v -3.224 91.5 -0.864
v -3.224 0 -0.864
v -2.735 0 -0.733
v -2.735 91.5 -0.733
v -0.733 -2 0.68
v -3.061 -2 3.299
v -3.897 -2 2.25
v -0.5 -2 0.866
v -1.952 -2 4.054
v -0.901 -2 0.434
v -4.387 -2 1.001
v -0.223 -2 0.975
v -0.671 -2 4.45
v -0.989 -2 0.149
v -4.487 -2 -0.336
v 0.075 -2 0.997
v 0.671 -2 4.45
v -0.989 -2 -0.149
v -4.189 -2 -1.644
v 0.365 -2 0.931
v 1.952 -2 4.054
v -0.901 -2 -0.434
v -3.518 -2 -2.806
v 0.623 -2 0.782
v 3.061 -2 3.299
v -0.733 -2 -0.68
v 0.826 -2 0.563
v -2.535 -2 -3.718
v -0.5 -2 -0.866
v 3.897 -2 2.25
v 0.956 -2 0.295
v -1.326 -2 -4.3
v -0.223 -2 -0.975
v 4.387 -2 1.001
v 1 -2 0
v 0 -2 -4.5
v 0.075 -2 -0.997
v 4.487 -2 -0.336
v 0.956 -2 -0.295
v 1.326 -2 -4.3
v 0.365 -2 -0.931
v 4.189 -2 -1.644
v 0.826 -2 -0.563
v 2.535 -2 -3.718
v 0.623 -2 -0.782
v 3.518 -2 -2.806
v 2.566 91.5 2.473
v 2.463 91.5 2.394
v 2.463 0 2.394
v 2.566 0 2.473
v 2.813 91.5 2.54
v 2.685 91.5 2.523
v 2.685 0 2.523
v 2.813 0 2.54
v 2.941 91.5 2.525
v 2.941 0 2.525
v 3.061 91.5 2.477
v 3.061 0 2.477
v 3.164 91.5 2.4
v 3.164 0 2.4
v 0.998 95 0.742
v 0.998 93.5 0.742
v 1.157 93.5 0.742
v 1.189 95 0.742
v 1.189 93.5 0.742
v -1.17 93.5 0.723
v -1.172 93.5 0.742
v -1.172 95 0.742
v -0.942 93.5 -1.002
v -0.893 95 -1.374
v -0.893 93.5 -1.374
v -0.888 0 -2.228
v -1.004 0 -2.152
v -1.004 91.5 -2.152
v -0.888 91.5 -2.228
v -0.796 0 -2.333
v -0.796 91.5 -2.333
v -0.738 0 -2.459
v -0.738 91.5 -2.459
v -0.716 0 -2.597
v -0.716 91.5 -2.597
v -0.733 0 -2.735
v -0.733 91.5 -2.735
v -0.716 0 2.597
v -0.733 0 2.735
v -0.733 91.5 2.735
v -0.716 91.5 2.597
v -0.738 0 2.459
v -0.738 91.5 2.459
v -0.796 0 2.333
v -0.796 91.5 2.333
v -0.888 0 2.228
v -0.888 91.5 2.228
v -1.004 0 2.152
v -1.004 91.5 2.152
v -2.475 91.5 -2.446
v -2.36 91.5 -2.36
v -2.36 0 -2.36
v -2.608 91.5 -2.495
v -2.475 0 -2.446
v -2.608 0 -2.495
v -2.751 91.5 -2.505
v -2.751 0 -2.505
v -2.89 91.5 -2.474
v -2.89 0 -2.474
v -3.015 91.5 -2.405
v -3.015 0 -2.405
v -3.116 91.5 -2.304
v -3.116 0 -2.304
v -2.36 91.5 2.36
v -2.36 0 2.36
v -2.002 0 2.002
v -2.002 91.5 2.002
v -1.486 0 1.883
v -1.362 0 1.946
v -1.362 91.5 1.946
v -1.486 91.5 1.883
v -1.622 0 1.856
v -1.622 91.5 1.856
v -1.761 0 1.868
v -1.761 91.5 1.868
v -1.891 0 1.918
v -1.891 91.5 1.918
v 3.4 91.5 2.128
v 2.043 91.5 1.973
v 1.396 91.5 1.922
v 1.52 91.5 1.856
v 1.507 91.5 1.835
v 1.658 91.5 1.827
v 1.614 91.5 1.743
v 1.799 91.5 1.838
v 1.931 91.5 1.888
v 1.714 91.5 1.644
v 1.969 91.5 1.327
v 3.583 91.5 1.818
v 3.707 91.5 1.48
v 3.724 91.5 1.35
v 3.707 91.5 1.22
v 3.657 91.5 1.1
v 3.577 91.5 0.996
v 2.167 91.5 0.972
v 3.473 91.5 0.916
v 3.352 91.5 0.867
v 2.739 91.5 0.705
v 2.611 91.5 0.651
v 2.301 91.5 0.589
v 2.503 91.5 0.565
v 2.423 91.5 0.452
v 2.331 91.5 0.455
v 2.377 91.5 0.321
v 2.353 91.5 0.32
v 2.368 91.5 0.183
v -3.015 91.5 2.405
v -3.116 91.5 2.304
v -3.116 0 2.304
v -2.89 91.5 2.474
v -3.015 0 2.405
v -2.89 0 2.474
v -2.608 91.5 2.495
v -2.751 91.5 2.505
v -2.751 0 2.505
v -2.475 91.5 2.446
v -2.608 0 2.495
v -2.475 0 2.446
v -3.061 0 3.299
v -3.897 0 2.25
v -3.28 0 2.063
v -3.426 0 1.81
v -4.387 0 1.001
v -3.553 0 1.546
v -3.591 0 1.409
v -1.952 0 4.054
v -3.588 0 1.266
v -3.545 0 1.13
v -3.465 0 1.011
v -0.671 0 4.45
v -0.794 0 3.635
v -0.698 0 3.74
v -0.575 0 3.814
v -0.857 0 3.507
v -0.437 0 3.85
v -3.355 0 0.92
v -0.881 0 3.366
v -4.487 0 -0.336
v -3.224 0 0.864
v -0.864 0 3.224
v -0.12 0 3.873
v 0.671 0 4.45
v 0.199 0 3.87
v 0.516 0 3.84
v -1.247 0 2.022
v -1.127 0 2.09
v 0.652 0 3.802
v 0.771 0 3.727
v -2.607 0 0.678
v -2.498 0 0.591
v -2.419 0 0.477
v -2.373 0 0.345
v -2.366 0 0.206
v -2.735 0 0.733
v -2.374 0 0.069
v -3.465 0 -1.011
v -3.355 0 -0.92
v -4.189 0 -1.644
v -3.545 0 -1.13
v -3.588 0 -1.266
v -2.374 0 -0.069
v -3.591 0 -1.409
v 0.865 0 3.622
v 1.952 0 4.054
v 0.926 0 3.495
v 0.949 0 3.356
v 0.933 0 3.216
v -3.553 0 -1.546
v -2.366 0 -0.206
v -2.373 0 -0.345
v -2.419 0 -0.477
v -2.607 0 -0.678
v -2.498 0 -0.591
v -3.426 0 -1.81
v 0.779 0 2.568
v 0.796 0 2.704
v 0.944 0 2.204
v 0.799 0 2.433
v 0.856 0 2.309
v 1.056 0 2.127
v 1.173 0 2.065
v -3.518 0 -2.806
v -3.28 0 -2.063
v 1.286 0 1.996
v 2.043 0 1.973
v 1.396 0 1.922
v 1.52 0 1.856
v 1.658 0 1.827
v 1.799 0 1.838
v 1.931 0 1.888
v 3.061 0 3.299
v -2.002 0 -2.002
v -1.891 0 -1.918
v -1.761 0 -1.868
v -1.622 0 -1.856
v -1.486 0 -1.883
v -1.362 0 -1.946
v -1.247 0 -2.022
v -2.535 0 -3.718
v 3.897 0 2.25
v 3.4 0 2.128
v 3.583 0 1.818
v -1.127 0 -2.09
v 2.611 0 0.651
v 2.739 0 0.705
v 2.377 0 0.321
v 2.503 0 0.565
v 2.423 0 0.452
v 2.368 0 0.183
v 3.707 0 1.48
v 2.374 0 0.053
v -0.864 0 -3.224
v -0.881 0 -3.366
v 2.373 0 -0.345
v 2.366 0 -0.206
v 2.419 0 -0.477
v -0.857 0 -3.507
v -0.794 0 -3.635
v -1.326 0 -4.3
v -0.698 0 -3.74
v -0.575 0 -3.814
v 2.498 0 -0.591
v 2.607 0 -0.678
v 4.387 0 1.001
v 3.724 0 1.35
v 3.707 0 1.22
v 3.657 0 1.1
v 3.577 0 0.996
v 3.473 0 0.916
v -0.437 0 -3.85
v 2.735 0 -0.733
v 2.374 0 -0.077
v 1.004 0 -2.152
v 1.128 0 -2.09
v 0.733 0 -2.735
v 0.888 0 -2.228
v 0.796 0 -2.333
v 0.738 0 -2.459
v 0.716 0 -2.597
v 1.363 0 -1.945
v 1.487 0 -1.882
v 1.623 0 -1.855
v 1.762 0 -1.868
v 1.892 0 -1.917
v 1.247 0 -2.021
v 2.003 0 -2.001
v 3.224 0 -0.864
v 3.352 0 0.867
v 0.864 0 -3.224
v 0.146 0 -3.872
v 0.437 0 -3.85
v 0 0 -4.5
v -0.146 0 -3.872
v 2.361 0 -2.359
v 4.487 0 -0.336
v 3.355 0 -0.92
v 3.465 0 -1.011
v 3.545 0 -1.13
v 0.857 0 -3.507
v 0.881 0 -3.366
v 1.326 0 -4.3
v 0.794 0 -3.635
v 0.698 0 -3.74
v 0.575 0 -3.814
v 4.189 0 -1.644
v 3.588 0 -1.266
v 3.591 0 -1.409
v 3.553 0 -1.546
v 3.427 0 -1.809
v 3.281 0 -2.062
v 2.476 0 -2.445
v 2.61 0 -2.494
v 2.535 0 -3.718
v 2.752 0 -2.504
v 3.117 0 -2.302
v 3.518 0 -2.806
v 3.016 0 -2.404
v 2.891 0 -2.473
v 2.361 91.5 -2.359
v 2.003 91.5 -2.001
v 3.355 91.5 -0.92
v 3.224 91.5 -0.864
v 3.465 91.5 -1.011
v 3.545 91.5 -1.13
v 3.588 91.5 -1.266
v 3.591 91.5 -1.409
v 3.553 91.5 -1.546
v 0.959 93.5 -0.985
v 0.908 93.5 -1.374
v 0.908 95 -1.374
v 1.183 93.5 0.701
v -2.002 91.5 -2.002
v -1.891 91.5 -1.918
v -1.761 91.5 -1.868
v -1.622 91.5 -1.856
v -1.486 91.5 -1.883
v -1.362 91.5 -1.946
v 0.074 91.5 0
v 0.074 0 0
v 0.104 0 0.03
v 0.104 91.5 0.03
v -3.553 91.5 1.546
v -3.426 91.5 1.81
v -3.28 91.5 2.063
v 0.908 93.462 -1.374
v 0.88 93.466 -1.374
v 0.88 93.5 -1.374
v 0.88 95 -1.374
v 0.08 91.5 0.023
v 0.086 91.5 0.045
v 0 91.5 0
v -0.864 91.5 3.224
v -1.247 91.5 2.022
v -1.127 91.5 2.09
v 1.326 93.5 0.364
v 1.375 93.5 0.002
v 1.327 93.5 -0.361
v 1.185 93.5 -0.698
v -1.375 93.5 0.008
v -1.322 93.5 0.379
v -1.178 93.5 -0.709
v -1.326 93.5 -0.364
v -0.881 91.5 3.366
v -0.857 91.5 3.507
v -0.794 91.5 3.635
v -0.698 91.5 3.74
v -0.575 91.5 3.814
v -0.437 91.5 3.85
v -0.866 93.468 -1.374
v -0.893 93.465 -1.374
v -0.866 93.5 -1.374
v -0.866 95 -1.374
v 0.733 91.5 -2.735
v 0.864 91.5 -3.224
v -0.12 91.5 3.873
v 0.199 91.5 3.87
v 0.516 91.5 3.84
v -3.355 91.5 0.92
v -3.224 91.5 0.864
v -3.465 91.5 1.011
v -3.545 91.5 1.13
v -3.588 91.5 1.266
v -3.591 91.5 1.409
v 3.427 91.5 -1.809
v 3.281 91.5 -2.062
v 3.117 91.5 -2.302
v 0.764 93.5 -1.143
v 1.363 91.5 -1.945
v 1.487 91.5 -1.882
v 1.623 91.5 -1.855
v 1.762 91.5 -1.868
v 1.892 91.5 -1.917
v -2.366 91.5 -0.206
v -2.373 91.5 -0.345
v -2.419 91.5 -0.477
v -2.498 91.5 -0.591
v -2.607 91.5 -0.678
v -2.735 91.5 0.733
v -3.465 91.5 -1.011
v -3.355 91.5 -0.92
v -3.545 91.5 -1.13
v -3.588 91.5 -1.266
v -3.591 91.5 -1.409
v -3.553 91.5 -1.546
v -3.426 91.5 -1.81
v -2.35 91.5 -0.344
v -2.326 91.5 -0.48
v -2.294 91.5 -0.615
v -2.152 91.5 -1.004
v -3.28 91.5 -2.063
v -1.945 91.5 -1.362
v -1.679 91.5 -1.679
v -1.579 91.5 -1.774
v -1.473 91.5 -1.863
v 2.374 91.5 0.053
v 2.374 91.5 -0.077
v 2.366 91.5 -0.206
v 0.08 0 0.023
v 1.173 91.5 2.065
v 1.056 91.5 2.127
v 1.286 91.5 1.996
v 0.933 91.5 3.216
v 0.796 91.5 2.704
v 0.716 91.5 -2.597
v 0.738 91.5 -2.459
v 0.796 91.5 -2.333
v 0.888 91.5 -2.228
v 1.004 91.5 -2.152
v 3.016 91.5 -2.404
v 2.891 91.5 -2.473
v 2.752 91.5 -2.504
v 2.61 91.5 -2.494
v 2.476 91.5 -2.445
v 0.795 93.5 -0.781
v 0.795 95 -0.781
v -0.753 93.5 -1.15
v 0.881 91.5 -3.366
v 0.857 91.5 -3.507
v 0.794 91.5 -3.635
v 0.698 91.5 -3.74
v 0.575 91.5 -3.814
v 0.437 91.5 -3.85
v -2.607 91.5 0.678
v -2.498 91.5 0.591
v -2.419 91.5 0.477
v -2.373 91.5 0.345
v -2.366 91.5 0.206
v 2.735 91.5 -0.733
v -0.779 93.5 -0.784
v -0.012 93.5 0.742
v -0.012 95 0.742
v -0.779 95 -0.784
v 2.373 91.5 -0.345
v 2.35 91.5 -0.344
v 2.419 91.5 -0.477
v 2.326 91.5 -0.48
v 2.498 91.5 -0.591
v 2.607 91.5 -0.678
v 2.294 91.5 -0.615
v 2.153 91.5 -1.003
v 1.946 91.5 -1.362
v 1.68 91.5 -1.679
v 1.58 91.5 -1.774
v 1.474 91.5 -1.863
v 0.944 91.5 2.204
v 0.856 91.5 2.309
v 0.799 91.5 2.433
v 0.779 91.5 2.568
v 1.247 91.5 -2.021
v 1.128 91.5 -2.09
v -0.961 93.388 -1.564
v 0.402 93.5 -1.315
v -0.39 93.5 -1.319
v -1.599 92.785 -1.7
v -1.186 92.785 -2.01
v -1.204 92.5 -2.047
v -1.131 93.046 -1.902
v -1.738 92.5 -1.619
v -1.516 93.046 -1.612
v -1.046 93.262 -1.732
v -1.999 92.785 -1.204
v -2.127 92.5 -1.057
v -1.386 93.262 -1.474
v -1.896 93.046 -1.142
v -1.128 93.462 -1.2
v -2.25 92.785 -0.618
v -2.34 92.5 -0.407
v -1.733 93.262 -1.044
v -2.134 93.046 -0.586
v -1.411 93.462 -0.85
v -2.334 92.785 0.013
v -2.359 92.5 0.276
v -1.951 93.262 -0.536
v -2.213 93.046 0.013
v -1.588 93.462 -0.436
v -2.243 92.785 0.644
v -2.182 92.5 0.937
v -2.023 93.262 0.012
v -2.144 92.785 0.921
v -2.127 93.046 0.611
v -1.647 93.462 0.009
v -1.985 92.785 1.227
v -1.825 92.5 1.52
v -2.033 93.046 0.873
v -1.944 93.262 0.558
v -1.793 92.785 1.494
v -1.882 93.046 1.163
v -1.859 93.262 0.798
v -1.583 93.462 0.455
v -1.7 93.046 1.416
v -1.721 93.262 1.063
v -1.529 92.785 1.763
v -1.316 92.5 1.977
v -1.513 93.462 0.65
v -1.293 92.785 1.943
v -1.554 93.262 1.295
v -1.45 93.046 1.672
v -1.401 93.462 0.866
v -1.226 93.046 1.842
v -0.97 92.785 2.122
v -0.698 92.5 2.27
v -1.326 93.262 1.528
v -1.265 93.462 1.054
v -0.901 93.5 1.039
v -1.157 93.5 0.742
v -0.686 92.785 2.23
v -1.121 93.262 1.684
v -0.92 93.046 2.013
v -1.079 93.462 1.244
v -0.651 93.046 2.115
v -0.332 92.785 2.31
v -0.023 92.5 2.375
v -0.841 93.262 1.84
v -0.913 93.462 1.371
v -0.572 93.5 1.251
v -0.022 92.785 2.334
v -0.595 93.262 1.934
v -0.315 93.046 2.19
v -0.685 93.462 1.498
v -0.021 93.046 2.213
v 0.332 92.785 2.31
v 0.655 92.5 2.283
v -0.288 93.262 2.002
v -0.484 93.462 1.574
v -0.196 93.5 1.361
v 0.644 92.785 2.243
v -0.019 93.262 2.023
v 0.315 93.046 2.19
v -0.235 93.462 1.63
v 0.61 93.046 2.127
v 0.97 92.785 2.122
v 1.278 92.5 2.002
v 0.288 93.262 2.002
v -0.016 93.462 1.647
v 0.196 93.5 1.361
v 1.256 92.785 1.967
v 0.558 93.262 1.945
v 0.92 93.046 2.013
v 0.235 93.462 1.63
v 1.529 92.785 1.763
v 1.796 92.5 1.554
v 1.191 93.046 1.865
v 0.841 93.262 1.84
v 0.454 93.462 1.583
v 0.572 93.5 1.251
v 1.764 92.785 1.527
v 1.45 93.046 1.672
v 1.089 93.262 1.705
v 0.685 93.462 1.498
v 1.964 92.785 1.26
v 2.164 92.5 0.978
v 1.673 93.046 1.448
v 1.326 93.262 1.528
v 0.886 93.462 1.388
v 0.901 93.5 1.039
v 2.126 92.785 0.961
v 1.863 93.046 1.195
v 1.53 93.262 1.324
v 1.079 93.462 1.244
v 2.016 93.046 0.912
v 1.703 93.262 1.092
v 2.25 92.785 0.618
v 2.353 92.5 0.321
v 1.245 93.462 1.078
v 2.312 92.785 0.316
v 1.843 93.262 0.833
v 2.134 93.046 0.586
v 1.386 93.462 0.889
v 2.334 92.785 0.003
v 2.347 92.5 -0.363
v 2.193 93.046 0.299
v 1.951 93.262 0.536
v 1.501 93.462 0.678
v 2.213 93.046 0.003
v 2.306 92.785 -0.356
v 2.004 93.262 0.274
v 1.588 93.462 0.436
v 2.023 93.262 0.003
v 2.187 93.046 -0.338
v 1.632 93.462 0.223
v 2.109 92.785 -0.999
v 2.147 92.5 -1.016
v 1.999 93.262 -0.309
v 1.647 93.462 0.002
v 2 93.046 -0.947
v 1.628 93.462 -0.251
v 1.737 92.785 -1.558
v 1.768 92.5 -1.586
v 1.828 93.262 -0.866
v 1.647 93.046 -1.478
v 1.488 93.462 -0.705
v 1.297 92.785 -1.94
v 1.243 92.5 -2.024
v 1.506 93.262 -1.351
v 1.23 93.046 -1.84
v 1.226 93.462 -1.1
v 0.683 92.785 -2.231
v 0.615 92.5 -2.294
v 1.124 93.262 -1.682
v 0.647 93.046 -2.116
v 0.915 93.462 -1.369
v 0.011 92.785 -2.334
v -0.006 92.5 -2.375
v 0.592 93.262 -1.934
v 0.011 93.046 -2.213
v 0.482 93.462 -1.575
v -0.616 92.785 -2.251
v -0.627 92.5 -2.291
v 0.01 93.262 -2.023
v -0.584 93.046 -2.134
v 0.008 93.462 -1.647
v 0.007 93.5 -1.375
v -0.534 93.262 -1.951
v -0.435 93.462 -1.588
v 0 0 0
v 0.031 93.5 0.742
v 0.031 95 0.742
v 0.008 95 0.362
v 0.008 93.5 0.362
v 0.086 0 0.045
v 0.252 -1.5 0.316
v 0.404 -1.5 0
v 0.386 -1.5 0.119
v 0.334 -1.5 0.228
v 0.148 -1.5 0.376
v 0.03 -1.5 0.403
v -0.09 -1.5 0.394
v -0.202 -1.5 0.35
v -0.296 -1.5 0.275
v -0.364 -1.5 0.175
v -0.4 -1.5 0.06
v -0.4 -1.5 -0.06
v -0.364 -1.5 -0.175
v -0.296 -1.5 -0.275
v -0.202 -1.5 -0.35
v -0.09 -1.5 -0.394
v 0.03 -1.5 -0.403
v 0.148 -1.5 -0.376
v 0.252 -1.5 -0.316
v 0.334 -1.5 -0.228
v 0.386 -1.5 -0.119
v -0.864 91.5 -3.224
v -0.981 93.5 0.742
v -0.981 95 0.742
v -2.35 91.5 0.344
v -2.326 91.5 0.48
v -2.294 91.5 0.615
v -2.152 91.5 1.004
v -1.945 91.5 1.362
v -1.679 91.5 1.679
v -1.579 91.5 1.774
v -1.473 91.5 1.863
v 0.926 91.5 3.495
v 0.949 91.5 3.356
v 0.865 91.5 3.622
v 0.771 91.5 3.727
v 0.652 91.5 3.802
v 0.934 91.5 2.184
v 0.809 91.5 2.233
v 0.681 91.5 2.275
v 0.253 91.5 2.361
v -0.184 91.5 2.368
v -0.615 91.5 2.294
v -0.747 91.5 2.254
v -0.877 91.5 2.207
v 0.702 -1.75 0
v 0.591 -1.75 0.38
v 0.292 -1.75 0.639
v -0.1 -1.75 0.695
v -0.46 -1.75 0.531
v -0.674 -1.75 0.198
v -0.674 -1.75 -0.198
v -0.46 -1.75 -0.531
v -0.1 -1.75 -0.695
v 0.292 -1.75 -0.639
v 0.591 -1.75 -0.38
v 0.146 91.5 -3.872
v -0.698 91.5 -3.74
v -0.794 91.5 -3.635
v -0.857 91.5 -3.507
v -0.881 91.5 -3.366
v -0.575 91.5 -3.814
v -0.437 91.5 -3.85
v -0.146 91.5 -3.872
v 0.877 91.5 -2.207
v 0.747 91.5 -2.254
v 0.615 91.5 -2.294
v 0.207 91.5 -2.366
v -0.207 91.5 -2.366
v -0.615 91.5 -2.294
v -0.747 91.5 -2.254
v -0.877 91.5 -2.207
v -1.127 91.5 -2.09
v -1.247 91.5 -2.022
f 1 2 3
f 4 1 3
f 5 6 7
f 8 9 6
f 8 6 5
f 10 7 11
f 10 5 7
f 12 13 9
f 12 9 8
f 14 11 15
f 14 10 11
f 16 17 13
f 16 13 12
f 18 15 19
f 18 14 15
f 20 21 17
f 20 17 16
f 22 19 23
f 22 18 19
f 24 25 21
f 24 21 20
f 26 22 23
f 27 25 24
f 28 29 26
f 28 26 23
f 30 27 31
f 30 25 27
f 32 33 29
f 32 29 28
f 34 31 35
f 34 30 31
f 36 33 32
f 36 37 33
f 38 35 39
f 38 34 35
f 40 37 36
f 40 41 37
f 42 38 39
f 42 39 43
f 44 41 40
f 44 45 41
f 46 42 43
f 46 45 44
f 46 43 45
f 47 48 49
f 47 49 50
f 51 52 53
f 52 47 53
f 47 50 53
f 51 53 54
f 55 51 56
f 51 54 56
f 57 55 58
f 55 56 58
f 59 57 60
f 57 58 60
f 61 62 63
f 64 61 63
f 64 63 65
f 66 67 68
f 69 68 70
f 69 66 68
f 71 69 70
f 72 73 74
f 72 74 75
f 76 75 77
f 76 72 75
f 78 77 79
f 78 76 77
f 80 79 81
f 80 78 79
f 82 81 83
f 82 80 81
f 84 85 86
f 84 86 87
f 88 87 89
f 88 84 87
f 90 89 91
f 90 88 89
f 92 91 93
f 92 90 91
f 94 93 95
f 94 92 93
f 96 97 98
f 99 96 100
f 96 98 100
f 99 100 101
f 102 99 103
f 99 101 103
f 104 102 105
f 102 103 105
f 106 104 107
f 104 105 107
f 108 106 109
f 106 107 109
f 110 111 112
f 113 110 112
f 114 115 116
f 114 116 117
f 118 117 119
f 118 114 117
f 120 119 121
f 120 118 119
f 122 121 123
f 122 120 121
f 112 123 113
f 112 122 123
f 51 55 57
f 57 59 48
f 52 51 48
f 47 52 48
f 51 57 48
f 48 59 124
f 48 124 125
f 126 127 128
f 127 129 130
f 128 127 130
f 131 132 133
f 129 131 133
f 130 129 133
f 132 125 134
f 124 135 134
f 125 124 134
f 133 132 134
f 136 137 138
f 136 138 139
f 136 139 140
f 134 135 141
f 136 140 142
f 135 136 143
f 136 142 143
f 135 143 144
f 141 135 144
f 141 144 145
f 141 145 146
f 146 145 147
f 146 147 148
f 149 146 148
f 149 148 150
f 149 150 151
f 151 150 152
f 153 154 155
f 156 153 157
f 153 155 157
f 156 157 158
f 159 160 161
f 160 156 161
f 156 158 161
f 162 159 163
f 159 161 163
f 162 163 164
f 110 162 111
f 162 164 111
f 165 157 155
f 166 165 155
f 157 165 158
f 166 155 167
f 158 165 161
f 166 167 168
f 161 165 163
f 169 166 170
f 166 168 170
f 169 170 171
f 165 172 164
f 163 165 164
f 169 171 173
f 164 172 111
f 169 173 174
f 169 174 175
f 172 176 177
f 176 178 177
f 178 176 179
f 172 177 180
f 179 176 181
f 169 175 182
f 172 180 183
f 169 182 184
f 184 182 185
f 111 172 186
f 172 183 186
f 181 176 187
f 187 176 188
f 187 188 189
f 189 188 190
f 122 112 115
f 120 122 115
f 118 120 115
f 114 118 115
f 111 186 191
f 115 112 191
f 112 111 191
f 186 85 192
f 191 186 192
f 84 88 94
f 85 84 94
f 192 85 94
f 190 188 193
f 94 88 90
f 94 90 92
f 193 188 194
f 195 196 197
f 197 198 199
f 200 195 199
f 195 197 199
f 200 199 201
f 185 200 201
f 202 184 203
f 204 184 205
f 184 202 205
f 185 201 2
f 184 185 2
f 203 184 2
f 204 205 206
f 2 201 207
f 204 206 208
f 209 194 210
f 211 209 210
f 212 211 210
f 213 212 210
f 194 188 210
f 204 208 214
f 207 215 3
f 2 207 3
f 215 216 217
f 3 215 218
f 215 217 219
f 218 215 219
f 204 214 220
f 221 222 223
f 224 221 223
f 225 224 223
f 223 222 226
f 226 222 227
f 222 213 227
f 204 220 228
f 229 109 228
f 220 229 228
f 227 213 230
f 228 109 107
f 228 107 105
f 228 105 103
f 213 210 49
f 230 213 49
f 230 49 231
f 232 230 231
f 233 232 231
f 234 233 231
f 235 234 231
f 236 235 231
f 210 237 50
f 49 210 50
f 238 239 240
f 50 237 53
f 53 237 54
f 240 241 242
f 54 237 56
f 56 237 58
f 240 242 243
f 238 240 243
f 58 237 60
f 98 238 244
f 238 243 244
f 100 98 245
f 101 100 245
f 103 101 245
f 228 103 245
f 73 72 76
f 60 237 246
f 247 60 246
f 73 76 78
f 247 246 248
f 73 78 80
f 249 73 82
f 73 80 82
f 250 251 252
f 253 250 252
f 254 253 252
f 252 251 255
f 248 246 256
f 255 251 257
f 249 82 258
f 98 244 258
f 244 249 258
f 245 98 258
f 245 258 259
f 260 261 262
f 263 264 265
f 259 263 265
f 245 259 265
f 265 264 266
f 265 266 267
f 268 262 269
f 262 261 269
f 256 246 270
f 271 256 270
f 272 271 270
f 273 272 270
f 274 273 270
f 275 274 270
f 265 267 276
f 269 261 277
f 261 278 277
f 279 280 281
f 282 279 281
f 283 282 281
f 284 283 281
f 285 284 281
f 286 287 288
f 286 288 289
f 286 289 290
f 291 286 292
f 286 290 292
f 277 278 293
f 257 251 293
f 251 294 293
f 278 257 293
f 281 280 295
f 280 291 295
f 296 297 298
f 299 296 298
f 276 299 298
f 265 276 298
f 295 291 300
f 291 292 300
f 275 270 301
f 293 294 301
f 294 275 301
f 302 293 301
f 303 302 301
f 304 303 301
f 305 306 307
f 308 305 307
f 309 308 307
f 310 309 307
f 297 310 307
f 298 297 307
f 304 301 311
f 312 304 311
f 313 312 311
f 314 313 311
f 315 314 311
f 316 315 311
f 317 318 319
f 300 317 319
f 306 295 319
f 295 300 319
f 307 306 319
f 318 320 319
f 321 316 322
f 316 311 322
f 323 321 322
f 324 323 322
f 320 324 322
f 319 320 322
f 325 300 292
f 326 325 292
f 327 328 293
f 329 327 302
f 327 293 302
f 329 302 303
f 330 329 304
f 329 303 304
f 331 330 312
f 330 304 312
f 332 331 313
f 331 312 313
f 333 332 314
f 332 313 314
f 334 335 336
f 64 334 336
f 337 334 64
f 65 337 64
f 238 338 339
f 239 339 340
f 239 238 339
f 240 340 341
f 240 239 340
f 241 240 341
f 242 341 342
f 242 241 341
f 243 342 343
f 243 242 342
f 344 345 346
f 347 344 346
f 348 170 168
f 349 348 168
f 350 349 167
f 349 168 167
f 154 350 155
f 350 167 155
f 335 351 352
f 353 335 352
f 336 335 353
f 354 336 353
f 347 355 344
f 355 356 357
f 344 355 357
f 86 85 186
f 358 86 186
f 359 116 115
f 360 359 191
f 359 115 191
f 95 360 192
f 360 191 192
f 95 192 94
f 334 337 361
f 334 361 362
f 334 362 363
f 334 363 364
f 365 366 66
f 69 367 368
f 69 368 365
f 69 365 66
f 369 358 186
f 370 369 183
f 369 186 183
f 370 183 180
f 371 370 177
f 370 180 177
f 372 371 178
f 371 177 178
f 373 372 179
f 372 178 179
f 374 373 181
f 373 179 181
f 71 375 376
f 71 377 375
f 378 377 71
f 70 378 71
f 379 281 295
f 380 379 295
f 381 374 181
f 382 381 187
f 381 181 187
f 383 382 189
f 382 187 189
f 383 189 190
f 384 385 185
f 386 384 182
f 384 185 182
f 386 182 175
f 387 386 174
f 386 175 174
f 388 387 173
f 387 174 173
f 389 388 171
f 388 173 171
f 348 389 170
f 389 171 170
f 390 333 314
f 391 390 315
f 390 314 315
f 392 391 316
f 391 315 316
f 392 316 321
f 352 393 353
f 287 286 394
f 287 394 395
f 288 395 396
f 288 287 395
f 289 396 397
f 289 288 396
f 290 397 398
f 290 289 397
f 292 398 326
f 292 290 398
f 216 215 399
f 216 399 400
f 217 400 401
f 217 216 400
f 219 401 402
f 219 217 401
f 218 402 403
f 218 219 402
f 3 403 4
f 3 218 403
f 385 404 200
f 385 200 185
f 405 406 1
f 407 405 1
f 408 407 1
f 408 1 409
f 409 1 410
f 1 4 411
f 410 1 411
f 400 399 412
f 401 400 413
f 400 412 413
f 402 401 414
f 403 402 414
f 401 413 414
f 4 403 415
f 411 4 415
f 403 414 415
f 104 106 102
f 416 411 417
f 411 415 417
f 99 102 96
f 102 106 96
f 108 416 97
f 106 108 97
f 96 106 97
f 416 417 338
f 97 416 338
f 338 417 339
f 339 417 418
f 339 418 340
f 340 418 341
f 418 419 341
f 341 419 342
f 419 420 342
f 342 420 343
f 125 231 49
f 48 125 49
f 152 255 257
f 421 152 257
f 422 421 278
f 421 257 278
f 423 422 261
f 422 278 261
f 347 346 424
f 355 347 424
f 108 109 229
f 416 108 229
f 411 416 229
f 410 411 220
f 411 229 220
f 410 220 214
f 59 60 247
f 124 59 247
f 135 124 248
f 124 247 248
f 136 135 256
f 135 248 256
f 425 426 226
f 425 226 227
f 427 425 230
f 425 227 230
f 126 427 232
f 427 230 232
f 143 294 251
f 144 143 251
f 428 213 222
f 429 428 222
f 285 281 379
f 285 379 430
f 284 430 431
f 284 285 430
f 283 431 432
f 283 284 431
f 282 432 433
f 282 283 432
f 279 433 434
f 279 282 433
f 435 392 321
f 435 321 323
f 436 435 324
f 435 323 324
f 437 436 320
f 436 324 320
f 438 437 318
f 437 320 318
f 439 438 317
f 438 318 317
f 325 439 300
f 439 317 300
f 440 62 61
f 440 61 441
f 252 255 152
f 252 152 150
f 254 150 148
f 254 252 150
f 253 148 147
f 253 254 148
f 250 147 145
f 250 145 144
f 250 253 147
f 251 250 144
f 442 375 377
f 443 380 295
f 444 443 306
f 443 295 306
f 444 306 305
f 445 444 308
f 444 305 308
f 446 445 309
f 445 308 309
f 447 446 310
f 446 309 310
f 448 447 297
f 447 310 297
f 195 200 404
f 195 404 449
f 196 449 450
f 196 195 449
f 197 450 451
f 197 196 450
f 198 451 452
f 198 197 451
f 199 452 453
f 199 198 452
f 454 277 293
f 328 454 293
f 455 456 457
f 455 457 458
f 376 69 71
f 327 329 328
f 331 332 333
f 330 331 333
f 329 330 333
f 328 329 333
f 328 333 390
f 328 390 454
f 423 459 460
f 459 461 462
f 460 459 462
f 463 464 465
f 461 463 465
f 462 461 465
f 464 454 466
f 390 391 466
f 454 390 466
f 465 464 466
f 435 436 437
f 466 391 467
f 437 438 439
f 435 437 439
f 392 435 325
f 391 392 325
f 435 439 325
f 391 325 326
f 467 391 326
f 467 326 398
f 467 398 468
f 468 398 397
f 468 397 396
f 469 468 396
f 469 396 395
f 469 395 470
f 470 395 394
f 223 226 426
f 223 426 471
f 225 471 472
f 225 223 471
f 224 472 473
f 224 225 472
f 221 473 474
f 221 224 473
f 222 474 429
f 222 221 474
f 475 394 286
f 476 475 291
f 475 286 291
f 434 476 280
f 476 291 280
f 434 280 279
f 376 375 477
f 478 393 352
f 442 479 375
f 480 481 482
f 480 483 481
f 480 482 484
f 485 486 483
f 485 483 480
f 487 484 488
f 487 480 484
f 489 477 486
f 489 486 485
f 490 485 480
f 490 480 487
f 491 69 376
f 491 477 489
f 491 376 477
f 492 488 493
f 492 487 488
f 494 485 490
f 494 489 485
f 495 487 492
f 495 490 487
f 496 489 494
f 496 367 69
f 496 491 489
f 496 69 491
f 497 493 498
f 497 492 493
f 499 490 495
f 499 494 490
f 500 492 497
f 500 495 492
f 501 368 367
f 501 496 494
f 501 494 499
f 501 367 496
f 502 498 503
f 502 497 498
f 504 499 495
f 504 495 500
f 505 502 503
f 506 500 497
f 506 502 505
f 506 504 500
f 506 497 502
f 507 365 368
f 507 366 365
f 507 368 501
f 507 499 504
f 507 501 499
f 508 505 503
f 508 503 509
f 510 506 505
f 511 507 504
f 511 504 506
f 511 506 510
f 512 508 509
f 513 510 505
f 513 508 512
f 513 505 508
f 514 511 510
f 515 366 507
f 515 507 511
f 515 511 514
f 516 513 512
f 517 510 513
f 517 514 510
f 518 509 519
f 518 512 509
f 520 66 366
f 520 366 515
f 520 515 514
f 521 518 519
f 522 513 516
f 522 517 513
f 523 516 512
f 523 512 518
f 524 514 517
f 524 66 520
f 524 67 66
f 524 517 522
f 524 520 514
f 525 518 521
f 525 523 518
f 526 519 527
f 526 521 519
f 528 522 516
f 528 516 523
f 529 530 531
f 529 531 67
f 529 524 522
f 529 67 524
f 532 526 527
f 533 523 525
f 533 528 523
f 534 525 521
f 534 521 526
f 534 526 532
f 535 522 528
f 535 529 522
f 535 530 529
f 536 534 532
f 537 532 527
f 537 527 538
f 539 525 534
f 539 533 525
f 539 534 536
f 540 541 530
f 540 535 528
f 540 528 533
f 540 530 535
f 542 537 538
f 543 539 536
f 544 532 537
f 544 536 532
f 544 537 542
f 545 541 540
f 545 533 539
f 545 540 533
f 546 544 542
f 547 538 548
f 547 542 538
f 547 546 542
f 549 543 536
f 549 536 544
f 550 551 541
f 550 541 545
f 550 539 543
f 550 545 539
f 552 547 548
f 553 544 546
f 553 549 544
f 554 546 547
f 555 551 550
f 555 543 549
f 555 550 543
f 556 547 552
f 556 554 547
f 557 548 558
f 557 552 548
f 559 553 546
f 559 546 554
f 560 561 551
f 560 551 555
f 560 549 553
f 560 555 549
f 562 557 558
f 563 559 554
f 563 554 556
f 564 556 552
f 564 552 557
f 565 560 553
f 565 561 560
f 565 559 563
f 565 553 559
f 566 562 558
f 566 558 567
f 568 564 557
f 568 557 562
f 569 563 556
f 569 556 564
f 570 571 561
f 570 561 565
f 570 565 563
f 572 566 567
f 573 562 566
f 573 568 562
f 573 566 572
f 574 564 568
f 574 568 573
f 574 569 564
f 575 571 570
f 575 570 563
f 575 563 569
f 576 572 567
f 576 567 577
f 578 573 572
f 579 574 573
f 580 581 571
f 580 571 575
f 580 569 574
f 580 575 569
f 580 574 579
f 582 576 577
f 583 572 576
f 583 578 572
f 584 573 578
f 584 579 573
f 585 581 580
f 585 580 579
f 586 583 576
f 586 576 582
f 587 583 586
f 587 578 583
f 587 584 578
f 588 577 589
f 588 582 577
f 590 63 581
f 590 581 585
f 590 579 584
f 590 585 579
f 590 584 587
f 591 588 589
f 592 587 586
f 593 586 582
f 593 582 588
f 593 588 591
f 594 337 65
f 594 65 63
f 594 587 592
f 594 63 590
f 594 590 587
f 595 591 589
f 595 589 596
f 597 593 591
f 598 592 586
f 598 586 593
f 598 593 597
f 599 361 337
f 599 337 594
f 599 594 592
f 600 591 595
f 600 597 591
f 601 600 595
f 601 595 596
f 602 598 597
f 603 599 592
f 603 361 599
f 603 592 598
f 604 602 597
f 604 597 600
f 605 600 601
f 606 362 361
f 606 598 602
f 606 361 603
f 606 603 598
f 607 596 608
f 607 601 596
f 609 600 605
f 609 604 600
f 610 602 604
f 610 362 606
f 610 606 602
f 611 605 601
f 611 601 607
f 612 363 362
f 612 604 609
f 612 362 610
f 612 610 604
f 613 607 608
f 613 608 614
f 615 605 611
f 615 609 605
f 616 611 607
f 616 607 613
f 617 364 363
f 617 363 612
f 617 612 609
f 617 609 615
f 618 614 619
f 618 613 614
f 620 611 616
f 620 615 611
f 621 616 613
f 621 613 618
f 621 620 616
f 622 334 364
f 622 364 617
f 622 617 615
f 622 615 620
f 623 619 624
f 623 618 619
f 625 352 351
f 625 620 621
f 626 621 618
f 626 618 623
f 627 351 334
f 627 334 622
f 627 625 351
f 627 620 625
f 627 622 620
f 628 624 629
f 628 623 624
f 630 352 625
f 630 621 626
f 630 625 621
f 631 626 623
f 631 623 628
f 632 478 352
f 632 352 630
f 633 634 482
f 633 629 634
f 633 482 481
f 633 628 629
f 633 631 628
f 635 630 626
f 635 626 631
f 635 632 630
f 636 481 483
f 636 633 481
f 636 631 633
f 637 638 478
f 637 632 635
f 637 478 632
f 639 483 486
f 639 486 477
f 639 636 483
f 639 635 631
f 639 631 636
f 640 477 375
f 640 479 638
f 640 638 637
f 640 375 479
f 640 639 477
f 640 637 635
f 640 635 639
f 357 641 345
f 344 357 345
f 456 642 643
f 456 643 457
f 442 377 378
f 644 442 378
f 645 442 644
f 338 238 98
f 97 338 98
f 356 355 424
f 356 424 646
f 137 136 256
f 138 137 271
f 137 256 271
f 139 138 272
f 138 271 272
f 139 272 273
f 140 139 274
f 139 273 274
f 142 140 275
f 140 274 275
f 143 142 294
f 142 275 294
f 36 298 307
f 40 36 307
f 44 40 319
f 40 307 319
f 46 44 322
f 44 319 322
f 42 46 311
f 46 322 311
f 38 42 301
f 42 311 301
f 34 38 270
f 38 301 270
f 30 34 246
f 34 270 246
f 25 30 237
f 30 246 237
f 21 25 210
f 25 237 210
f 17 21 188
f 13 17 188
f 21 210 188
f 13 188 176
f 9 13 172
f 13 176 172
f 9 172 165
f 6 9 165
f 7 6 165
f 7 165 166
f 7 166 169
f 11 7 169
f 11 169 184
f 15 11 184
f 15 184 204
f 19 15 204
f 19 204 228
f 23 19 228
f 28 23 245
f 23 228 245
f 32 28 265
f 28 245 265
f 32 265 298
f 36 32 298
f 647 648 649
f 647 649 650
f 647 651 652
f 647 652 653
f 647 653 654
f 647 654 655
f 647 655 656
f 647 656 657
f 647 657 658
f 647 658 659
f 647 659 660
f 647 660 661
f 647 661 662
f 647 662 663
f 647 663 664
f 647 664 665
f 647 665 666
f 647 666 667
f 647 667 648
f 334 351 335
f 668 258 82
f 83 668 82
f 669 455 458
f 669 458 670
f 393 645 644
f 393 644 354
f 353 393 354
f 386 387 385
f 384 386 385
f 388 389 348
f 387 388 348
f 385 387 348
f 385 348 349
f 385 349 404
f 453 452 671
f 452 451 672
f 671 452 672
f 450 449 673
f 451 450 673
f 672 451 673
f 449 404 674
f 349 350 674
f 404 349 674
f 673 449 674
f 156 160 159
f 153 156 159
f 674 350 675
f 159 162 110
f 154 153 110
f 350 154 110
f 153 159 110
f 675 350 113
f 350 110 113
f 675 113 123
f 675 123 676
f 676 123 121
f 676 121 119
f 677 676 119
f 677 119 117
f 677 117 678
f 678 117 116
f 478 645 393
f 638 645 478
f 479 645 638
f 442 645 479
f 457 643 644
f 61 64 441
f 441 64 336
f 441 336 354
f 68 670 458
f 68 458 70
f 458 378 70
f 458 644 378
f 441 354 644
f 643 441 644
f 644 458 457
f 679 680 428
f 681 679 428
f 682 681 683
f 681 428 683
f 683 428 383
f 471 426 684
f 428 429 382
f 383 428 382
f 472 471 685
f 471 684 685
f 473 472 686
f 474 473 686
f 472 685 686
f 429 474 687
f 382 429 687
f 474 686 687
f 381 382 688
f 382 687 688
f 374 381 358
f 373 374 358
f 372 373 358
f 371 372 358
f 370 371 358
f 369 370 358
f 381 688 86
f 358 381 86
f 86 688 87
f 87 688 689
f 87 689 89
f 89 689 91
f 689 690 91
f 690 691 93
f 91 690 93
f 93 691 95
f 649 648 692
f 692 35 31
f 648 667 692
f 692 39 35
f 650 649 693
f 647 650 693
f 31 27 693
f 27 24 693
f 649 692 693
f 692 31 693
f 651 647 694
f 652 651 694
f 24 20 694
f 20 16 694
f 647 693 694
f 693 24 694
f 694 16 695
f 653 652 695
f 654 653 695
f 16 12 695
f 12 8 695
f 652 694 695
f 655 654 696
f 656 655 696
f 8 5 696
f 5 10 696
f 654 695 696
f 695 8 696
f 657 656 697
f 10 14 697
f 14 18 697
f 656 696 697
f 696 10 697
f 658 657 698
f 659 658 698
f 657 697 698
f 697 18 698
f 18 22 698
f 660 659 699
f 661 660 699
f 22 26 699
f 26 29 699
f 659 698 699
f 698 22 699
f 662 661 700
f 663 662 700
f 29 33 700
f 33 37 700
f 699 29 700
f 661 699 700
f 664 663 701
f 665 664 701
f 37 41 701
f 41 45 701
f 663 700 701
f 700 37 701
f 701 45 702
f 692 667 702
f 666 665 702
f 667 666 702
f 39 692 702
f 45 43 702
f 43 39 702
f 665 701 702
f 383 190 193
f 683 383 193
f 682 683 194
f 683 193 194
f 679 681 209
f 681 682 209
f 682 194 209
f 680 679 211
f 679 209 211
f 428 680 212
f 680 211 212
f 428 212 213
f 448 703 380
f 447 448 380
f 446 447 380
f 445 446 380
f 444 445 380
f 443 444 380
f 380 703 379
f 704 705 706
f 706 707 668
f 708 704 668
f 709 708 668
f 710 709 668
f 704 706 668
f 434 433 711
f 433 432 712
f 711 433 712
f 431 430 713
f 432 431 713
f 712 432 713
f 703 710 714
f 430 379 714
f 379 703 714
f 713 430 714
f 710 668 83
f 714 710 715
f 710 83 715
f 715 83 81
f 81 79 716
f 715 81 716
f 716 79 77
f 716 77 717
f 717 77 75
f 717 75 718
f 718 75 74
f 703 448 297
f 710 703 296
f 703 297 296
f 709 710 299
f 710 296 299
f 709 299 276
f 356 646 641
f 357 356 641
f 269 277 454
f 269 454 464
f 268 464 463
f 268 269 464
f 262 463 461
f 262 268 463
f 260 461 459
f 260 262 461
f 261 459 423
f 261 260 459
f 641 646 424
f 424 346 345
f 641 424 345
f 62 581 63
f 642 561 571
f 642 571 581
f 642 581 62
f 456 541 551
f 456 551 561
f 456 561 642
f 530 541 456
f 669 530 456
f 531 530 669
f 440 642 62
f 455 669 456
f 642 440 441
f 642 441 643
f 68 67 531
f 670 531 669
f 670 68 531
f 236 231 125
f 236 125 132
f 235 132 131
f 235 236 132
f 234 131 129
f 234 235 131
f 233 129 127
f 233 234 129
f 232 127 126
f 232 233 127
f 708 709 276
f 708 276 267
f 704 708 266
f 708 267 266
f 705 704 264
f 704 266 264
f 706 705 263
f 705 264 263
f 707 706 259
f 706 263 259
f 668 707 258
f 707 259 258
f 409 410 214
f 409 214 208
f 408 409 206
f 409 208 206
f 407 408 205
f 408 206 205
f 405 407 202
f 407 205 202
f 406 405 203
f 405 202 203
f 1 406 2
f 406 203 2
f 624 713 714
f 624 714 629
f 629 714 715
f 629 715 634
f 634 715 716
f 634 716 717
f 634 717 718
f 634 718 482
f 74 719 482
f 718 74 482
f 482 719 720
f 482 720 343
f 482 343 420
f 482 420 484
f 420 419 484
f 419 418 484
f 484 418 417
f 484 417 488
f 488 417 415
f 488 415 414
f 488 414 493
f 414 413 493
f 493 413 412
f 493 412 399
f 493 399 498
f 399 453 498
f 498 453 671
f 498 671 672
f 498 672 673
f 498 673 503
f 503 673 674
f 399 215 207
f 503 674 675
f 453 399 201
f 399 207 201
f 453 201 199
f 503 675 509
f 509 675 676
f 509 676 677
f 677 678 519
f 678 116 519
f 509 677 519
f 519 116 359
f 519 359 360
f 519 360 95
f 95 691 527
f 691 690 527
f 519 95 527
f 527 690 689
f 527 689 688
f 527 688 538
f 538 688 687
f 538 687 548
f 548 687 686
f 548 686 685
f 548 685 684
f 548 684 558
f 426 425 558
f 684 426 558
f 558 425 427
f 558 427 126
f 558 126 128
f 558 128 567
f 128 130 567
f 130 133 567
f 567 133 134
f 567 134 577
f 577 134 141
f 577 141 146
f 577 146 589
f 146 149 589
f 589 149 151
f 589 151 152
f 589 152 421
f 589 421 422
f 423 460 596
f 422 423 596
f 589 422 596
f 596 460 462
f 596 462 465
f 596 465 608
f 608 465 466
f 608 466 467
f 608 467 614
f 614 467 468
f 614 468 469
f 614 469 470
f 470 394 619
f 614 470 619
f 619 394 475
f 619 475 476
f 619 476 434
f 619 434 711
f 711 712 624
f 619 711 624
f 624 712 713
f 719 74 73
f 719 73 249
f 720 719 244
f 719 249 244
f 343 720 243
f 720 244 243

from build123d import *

# Parameters (mm, degrees)
BOSS_EXTRUDE1_DEPTH = 91.5
SKETCH3_R           = 4.5
BOSS_EXTRUDE2_DEPTH = 2
SKETCH4_R           = 2.375
BOSS_EXTRUDE3_DEPTH = 2
FILLET1_R           = 0.5
SKETCH6_R           = 1
CUT_EXTRUDE4_DEPTH  = 0.5
CUT_EXTRUDE4_DRAFT  = -50
BOSS_EXTRUDE4_DEPTH = 1.5
FILLET2_R           = 1


with BuildPart() as part:
    # Sketch2 → Boss-Extrude1 (new body)
    with BuildSketch(Plane(origin=(0, 0, 0), x_dir=(1, 0, 0), z_dir=(0, 1, 0))):
        with BuildLine():
            Line((3.775215965, -0.978645895), (2.300774305, -0.58912019))
            ThreePointArc((2.300774305, -0.58912019), (2.374963211, 0.013219106), (2.294073837, 0.614695232))
            Line((2.294073837, 0.614695232), (3.742962577, 1.0029238))
            ThreePointArc((3.742962577, 1.0029238), (3.356294138, 1.936727823), (2.741299364, 2.73877761))
            Line((2.741299364, 2.73877761), (1.680151223, 1.678605632))
            ThreePointArc((1.680151223, 1.678605632), (1.187973207, 2.056537055), (0.614695232, 2.294073837))
            Line((0.614695232, 2.294073837), (1.0029238, 3.742962577))
            ThreePointArc((1.0029238, 3.742962577), (0, 3.875), (-1.0029238, 3.742962577))
            Line((-1.0029238, 3.742962577), (-0.614695232, 2.294073837))
            ThreePointArc((-0.614695232, 2.294073837), (-1.1875, 2.056810334), (-1.679378605, 1.679378605))
            Line((-1.679378605, 1.679378605), (-2.740038777, 2.740038777))
            ThreePointArc((-2.740038777, 2.740038777), (-3.35584844, 1.9375), (-3.742962577, 1.0029238))
            Line((-3.742962577, 1.0029238), (-2.294073837, 0.614695232))
            ThreePointArc((-2.294073837, 0.614695232), (-2.375, 0), (-2.294073837, -0.614695232))
            Line((-2.294073837, -0.614695232), (-3.742962577, -1.0029238))
            ThreePointArc((-3.742962577, -1.0029238), (-3.35584844, -1.9375), (-2.740038777, -2.740038777))
            Line((-2.740038777, -2.740038777), (-1.679378605, -1.679378605))
            ThreePointArc((-1.679378605, -1.679378605), (-1.1875, -2.056810334), (-0.614695232, -2.294073837))
            Line((-0.614695232, -2.294073837), (-1.0029238, -3.742962577))
            ThreePointArc((-1.0029238, -3.742962577), (0.033967076, -3.874851125), (1.068386506, -3.724805401))
            Line((1.068386506, -3.724805401), (0.681359786, -2.275164575))
            ThreePointArc((0.681359786, -2.275164575), (1.238849907, -2.026296106), (1.714477211, -1.643530618))
            Line((1.714477211, -1.643530618), (2.767163136, -2.698133353))
            ThreePointArc((2.767163136, -2.698133353), (3.500652231, -1.972912562), (3.775215965, -0.978645895))
        make_face()
        Polygon((0.085836926, -0.044584082), (0, 0), (0.073933818, 0), (0.104207494, -0.030328801), (0.080162685, -0.023330742), align=None, mode=Mode.SUBTRACT)
    extrude(amount=BOSS_EXTRUDE1_DEPTH)

    # Sketch3 → Boss-Extrude2 (add)
    with BuildSketch(Plane.XZ):
        with Locations(Location((0, 0, 0), (0, 0, 270))):
            Circle(SKETCH3_R)
    extrude(amount=BOSS_EXTRUDE2_DEPTH)

    # Sketch4 → Boss-Extrude3 (add)
    with BuildSketch(Plane(origin=(0, 91.5, 0), x_dir=(1, 0, 0), z_dir=(0, 1, 0))):
        with Locations(Location((0, 0, 0), (0, 0, 75))):
            Circle(SKETCH4_R)
    extrude(amount=BOSS_EXTRUDE3_DEPTH)

    # Fillet1
    # the kernel refuses this fillet: 0.5 mm, written as the material it adds along each edge
    with BuildSketch(Plane(origin=(-2.294073837, -1.140469783, 0.614695232), x_dir=(-0.965925826289068, 0, 0.2588190451025218), z_dir=(0, 1, 0)), Plane(origin=(-1.679378605, -1.140469783, -1.679378605), x_dir=(-0.7071067811865478, 0, -0.7071067811865474), z_dir=(0, 1, 0)), Plane(origin=(0.614695232, -1.140469783, -2.294073837), x_dir=(0.2588190451025215, 0, -0.9659258262890681), z_dir=(0, 1, 0)), Plane(origin=(2.294073837, -1.140469783, -0.614695232), x_dir=(0.9659258262890681, 0, -0.2588190451025215), z_dir=(0, 1, 0)), Plane(origin=(-0.614695232, -1.140469783, 2.294073837), x_dir=(-0.2588190451025215, 0, 0.9659258262890681), z_dir=(0, 1, 0))) as fillet1_piece_1:
        with BuildLine():
            CenterArc((0.456187913, -0.5), FILLET1_R, 90, 79.984589832)
            ThreePointArc((-0.036192593, -0.413043478), (-0.00906545, -0.20731306), (0, 0))
            Line((0, 0), (0.456187913, 0))
        make_face()
    extrude(amount=92.640469783)
    with BuildSketch(Plane(origin=(-2.294073837, -1.140469783, -0.614695232), x_dir=(-0.17351574004952178, 0, 0.9848310961556133), z_dir=(0, 1, 0)), Plane(origin=(-1.679378605, -1.140469783, 1.679378605), x_dir=(0.7661308776828862, 0, 0.6426845869171364), z_dir=(0, 1, 0))) as fillet1_piece_2:
        with BuildLine():
            CenterArc((0.458270974, -0.498091484), FILLET1_R, 95.007705084, 79.984589832)
            Line((-0.03982051, -0.45444663), (0, 0))
            ThreePointArc((0, 0), (0.20731306, -0.00906545), (0.414626119, 0))
        make_face()
    extrude(amount=92.640469783)
    with BuildSketch(Plane(origin=(-0.614695232, -1.140469783, -2.294073837), x_dir=(-0.258819045102522, 0, -0.965925826289068), z_dir=(0, 1, 0)), Plane(origin=(1.680151223, -1.140469783, -1.678605632), x_dir=(0.707432093873984, 0, -0.7067813187663288), z_dir=(0, 1, 0))) as fillet1_piece_3:
        with BuildLine():
            CenterArc((0.456187913, 0.5), FILLET1_R, 190.015410168, 79.984589832)
            ThreePointArc((-0.036192593, 0.413043478), (-0.00906545, 0.20731306), (0, 0))
            Line((0, 0), (0.456187913, 0))
        make_face()
    extrude(amount=92.640469783)
    with BuildSketch(Plane(origin=(2.300774305, -1.132506036, 0.58912019), x_dir=(0.16314582309469597, 0, -0.9866019665532569), z_dir=(0, 1, 0))) as fillet1_piece_4:
        with BuildLine():
            CenterArc((0.455070929, -0.498118095), FILLET1_R, 94.972648578, 79.61829146)
            Line((-0.042702606, -0.450985227), (0, 0))
            ThreePointArc((0, 0), (0.20586542, -0.008939048), (0.411730841, 0))
        make_face()
    extrude(amount=92.632506036)
    with BuildSketch(Plane(origin=(1.714477211, -1.163771178, 1.643530618), x_dir=(0.7064632978713467, 0, 0.7077496794494088), z_dir=(0, 1, 0))) as fillet1_piece_5:
        with BuildLine():
            CenterArc((0.465508471, -0.5), FILLET1_R, 90, 81.041880237)
            ThreePointArc((-0.02839274, -0.422143763), (-0.00477723, -0.211705398), (0, 0))
            Line((0, 0), (0.465508471, 0))
        make_face()
    extrude(amount=92.663771178)
    with BuildSketch(Plane(origin=(0.681359786, -1.109284133, 2.275164575), x_dir=(0.9301474254657973, 0, -0.3671862836481626), z_dir=(0, 1, 0))) as fillet1_piece_6:
        with BuildLine():
            CenterArc((0.445739753, -0.498194619), FILLET1_R, 94.870436099, 78.535607624)
            Line((-0.050952689, -0.440778436), (0, 0))
            ThreePointArc((0, 0), (0.201644174, -0.008575561), (0.403288348, 0))
        make_face()
    extrude(amount=92.609284133)
    # the kernel refuses this fillet: 0.5 mm, written as the material it takes off along each edge
    with BuildSketch(Plane(origin=(-2.740038777, 0, 2.740038777), x_dir=(-0.6526300069150477, 0, -0.7576767609436524), z_dir=(0, 1, 0)), Plane(origin=(-3.742962577, 0, -1.0029238), x_dir=(0.32985231937679765, 0, -0.9440325457322681), z_dir=(0, 1, 0)), Plane(origin=(-1.0029238, 0, -3.742962577), x_dir=(0.982482326291838, 0, -0.18635578478860887), z_dir=(0, 1, 0)), Plane(origin=(2.741299364, 0, -2.73877761), x_dir=(0.6522812796019254, 0, 0.7579769998363239), z_dir=(0, 1, 0))) as fillet1_2_piece_1:
        with BuildLine():
            CenterArc((0.538524723, -0.49861874), FILLET1_R, 85.740187873, 98.519624254)
            Line((0.039905983, -0.535758376), (0, 0))
            ThreePointArc((0, 0), (0.287832179, 0.010704768), (0.575664359, 0))
        make_face()
    extrude(amount=92.939160897, mode=Mode.SUBTRACT)
    with BuildSketch(Plane(origin=(-3.742962577, 0, 1.0029238), x_dir=(0.9659258262890679, 0, -0.2588190451025218), z_dir=(0, 1, 0)), Plane(origin=(-2.740038777, 0, -2.740038777), x_dir=(0.7071067811865476, 0, 0.7071067811865476), z_dir=(0, 1, 0)), Plane(origin=(1.0029238, 0, -3.742962577), x_dir=(-0.25881904510252196, 0, 0.965925826289068), z_dir=(0, 1, 0)), Plane(origin=(3.742962577, 0, -1.0029238), x_dir=(-0.9659258262890681, 0, 0.25881904510252185), z_dir=(0, 1, 0)), Plane(origin=(-1.0029238, 0, 3.742962577), x_dir=(0.2588190451025216, 0, -0.9659258262890681), z_dir=(0, 1, 0))) as fillet1_2_piece_2:
        with BuildLine():
            CenterArc((0.537242519, -0.5), FILLET1_R, 90, 98.519624254)
            ThreePointArc((0.04275993, -0.574074074), (0.010704768, -0.287832179), (0, 0))
            Line((0, 0), (0.537242519, 0))
        make_face()
    extrude(amount=92.939160897, mode=Mode.SUBTRACT)
    with BuildSketch(Plane(origin=(3.775215965, 0, 0.978645895), x_dir=(-0.13498089829276533, 0, 0.9908482008340522), z_dir=(0, 1, 0))) as fillet1_2_piece_3:
        with BuildLine():
            CenterArc((0.442538799, -0.49598715), FILLET1_R, 82.736098253, 90.22281865)
            Line((-0.053690457, -0.434696649), (0, 0))
            ThreePointArc((0, 0), (0.252879314, 0.016051399), (0.505758627, 0))
        make_face()
    extrude(amount=92.764396568, mode=Mode.SUBTRACT)
    with BuildSketch(Plane(origin=(2.767163136, 0, 2.698133353), x_dir=(0.8000663385432955, 0, -0.5999115384203949), z_dir=(0, 1, 0))) as fillet1_2_piece_4:
        with BuildLine():
            CenterArc((0.434547354, 0.496131331), FILLET1_R, 188.084320914, 89.047719887)
            Line((-0.060483736, 0.425816179), (0, 0))
            ThreePointArc((0, 0), (0.248312773, -0.015474675), (0.496625547, 0))
        make_face()
    extrude(amount=92.741563867, mode=Mode.SUBTRACT)
    with BuildSketch(Plane(origin=(1.068386506, 0, 3.724805401), x_dir=(-0.9787647804449897, 0, 0.20498659605074468), z_dir=(0, 1, 0))) as fillet1_2_piece_5:
        with BuildLine():
            CenterArc((0.527919562, -0.498672678), FILLET1_R, 85.824226653, 97.295295094)
            Line((0.028660468, -0.525882193), (0, 0))
            ThreePointArc((0, 0), (0.282163904, 0.010286747), (0.564327807, 0))
        make_face()
    extrude(amount=92.910819518, mode=Mode.SUBTRACT)


with BuildPart() as cut_extrude4_tool:
    # Sketch6 → Cut-Extrude4 (with draft: the straight prism first)
    with BuildSketch(Plane.XZ.offset(2)):
        Circle(SKETCH6_R)
    extrude(amount=-CUT_EXTRUDE4_DEPTH)
    # Cut-Extrude4: the draft: its side faces are tilted about the plane it starts from
    cut_extrude4_sides = [cut_extrude4_tool.faces().sort_by_distance(p)[0] for p in [
        (-1, -1.75, 0),
    ]]
    draft(cut_extrude4_sides, Plane.XZ.offset(2), CUT_EXTRUDE4_DRAFT)


with BuildPart() as part_1:
    add(part.part)

    # Cut-Extrude4: cut by cut_extrude4_tool
    add(cut_extrude4_tool.part, mode=Mode.SUBTRACT)

    # Sketch5 → Boss-Extrude4 (add)
    with BuildSketch(Plane(origin=(0, 93.5, 0), x_dir=(1, 0, 0), z_dir=(0, 1, 0))):
        Polygon((-1.172253179, -0.742400791), (-0.892829434, 1.374265875), (-0.865692682, 1.374265875), (0.008195539, -0.362486261), (0.879963701, 1.374265875), (0.907524465, 1.374265875), (1.188644257, -0.742400791), (0.997838968, -0.742400791), (0.795161351, 0.780649422), (0.031092174, -0.742400791), (-0.011733013, -0.742400791), (-0.778770273, 0.784041516), (-0.981023879, -0.742400791), align=None)
    extrude(amount=BOSS_EXTRUDE4_DEPTH)

    # Fillet2
    # the kernel refuses this fillet: 1 mm, written as the material it takes off along each edge
    with BuildSketch(Plane(origin=(0, 93.5, 0), x_dir=(0.25881904510252074, 0, -0.9659258262890682), z_dir=(0.9659258262890682, 0, 0.25881904510252074))) as fillet2_piece_1_section:
        with BuildLine():
            CenterArc((2.375 - FILLET2_R, -FILLET2_R), FILLET2_R, 0, 90)
            Line((2.375 - FILLET2_R, 0), (2.375, 0))
            Line((2.375, 0), (2.375, -FILLET2_R))
        make_face()
    fillet2_piece_1 = revolve(axis=Axis((0, 93.5, 0), (0, 1, 0)), mode=Mode.PRIVATE)
    fillet2_piece_1 = split(fillet2_piece_1, bisect_by=Plane(origin=(0.991336006, 93.280732894, -1.596143773), z_dir=(-0.8937278759727254, 0, -0.44860950024412194)), keep=Keep.TOP, mode=Mode.PRIVATE)
    fillet2_piece_1 = split(fillet2_piece_1, bisect_by=Plane(origin=(-0.976518379, 93.280732894, -1.594519178), z_dir=(0.8932902553120649, 0, -0.44948027739213037)), keep=Keep.TOP, mode=Mode.PRIVATE)
    add(fillet2_piece_1, mode=Mode.SUBTRACT)
    with BuildSketch(Plane(origin=(0, 93.5, 0), x_dir=(0.25881904510252074, 0, -0.9659258262890682), z_dir=(0.9659258262890682, 0, 0.25881904510252074))) as fillet2_piece_2_section:
        with BuildLine():
            CenterArc((2.375 - FILLET2_R, -FILLET2_R), FILLET2_R, 0, 90)
            Line((2.375 - FILLET2_R, 0), (2.375, 0))
            Line((2.375, 0), (2.375, -FILLET2_R))
        make_face()
    fillet2_piece_2 = revolve(axis=Axis((0, 93.5, 0), (0, 1, 0)), mode=Mode.PRIVATE)
    fillet2_piece_2 = split(fillet2_piece_2, bisect_by=Plane(origin=(-0.882160768, 93.481308127, -1.374265875), z_dir=(0, 0, -1)), keep=Keep.TOP, mode=Mode.PRIVATE)
    add(fillet2_piece_2, mode=Mode.SUBTRACT)
    with BuildSketch(Plane(origin=(0, 93.5, 0), x_dir=(0.25881904510252074, 0, -0.9659258262890682), z_dir=(0.9659258262890682, 0, 0.25881904510252074))) as fillet2_piece_3_section:
        with BuildLine():
            CenterArc((2.375 - FILLET2_R, -FILLET2_R), FILLET2_R, 0, 90)
            Line((2.375 - FILLET2_R, 0), (2.375, 0))
            Line((2.375, 0), (2.375, -FILLET2_R))
        make_face()
    fillet2_piece_3 = revolve(axis=Axis((0, 93.5, 0), (0, 1, 0)), mode=Mode.PRIVATE)
    fillet2_piece_3 = split(fillet2_piece_3, bisect_by=Plane(origin=(1.060607469, 93.278124519, -0.221640908), z_dir=(0.9912954083909878, 0, -0.13165642142692804)), keep=Keep.TOP, mode=Mode.PRIVATE)
    add(fillet2_piece_3, mode=Mode.SUBTRACT)
    with BuildSketch(Plane(origin=(0, 93.5, 0), x_dir=(0.25881904510252074, 0, -0.9659258262890682), z_dir=(0.9659258262890682, 0, 0.25881904510252074))) as fillet2_piece_4_section:
        with BuildLine():
            CenterArc((2.375 - FILLET2_R, -FILLET2_R), FILLET2_R, 0, 90)
            Line((2.375 - FILLET2_R, 0), (2.375, 0))
            Line((2.375, 0), (2.375, -FILLET2_R))
        make_face()
    fillet2_piece_4 = revolve(axis=Axis((0, 93.5, 0), (0, 1, 0)), mode=Mode.PRIVATE)
    fillet2_piece_4 = split(fillet2_piece_4, bisect_by=Plane(origin=(-1.045137857, 93.278152838, -0.220512241), z_dir=(-0.9913987771987147, 0, -0.13087576005087198)), keep=Keep.TOP, mode=Mode.PRIVATE)
    add(fillet2_piece_4, mode=Mode.SUBTRACT)
    with BuildSketch(Plane(origin=(0, 93.5, 0), x_dir=(0.25881904510252074, 0, -0.9659258262890682), z_dir=(0.9659258262890682, 0, 0.25881904510252074))) as fillet2_piece_5_section:
        with BuildLine():
            CenterArc((2.375 - FILLET2_R, -FILLET2_R), FILLET2_R, 0, 90)
            Line((2.375 - FILLET2_R, 0), (2.375, 0))
            Line((2.375, 0), (2.375, -FILLET2_R))
        make_face()
    fillet2_piece_5 = revolve(axis=Axis((0, 93.5, 0), (0, 1, 0)), mode=Mode.PRIVATE)
    fillet2_piece_5 = split(fillet2_piece_5, bisect_by=Plane(origin=(-1.05473696, 93.291045211, 0.742400791), z_dir=(0, 0, 1)), keep=Keep.TOP, mode=Mode.PRIVATE)
    add(fillet2_piece_5, mode=Mode.SUBTRACT)


solid = part_1.part
